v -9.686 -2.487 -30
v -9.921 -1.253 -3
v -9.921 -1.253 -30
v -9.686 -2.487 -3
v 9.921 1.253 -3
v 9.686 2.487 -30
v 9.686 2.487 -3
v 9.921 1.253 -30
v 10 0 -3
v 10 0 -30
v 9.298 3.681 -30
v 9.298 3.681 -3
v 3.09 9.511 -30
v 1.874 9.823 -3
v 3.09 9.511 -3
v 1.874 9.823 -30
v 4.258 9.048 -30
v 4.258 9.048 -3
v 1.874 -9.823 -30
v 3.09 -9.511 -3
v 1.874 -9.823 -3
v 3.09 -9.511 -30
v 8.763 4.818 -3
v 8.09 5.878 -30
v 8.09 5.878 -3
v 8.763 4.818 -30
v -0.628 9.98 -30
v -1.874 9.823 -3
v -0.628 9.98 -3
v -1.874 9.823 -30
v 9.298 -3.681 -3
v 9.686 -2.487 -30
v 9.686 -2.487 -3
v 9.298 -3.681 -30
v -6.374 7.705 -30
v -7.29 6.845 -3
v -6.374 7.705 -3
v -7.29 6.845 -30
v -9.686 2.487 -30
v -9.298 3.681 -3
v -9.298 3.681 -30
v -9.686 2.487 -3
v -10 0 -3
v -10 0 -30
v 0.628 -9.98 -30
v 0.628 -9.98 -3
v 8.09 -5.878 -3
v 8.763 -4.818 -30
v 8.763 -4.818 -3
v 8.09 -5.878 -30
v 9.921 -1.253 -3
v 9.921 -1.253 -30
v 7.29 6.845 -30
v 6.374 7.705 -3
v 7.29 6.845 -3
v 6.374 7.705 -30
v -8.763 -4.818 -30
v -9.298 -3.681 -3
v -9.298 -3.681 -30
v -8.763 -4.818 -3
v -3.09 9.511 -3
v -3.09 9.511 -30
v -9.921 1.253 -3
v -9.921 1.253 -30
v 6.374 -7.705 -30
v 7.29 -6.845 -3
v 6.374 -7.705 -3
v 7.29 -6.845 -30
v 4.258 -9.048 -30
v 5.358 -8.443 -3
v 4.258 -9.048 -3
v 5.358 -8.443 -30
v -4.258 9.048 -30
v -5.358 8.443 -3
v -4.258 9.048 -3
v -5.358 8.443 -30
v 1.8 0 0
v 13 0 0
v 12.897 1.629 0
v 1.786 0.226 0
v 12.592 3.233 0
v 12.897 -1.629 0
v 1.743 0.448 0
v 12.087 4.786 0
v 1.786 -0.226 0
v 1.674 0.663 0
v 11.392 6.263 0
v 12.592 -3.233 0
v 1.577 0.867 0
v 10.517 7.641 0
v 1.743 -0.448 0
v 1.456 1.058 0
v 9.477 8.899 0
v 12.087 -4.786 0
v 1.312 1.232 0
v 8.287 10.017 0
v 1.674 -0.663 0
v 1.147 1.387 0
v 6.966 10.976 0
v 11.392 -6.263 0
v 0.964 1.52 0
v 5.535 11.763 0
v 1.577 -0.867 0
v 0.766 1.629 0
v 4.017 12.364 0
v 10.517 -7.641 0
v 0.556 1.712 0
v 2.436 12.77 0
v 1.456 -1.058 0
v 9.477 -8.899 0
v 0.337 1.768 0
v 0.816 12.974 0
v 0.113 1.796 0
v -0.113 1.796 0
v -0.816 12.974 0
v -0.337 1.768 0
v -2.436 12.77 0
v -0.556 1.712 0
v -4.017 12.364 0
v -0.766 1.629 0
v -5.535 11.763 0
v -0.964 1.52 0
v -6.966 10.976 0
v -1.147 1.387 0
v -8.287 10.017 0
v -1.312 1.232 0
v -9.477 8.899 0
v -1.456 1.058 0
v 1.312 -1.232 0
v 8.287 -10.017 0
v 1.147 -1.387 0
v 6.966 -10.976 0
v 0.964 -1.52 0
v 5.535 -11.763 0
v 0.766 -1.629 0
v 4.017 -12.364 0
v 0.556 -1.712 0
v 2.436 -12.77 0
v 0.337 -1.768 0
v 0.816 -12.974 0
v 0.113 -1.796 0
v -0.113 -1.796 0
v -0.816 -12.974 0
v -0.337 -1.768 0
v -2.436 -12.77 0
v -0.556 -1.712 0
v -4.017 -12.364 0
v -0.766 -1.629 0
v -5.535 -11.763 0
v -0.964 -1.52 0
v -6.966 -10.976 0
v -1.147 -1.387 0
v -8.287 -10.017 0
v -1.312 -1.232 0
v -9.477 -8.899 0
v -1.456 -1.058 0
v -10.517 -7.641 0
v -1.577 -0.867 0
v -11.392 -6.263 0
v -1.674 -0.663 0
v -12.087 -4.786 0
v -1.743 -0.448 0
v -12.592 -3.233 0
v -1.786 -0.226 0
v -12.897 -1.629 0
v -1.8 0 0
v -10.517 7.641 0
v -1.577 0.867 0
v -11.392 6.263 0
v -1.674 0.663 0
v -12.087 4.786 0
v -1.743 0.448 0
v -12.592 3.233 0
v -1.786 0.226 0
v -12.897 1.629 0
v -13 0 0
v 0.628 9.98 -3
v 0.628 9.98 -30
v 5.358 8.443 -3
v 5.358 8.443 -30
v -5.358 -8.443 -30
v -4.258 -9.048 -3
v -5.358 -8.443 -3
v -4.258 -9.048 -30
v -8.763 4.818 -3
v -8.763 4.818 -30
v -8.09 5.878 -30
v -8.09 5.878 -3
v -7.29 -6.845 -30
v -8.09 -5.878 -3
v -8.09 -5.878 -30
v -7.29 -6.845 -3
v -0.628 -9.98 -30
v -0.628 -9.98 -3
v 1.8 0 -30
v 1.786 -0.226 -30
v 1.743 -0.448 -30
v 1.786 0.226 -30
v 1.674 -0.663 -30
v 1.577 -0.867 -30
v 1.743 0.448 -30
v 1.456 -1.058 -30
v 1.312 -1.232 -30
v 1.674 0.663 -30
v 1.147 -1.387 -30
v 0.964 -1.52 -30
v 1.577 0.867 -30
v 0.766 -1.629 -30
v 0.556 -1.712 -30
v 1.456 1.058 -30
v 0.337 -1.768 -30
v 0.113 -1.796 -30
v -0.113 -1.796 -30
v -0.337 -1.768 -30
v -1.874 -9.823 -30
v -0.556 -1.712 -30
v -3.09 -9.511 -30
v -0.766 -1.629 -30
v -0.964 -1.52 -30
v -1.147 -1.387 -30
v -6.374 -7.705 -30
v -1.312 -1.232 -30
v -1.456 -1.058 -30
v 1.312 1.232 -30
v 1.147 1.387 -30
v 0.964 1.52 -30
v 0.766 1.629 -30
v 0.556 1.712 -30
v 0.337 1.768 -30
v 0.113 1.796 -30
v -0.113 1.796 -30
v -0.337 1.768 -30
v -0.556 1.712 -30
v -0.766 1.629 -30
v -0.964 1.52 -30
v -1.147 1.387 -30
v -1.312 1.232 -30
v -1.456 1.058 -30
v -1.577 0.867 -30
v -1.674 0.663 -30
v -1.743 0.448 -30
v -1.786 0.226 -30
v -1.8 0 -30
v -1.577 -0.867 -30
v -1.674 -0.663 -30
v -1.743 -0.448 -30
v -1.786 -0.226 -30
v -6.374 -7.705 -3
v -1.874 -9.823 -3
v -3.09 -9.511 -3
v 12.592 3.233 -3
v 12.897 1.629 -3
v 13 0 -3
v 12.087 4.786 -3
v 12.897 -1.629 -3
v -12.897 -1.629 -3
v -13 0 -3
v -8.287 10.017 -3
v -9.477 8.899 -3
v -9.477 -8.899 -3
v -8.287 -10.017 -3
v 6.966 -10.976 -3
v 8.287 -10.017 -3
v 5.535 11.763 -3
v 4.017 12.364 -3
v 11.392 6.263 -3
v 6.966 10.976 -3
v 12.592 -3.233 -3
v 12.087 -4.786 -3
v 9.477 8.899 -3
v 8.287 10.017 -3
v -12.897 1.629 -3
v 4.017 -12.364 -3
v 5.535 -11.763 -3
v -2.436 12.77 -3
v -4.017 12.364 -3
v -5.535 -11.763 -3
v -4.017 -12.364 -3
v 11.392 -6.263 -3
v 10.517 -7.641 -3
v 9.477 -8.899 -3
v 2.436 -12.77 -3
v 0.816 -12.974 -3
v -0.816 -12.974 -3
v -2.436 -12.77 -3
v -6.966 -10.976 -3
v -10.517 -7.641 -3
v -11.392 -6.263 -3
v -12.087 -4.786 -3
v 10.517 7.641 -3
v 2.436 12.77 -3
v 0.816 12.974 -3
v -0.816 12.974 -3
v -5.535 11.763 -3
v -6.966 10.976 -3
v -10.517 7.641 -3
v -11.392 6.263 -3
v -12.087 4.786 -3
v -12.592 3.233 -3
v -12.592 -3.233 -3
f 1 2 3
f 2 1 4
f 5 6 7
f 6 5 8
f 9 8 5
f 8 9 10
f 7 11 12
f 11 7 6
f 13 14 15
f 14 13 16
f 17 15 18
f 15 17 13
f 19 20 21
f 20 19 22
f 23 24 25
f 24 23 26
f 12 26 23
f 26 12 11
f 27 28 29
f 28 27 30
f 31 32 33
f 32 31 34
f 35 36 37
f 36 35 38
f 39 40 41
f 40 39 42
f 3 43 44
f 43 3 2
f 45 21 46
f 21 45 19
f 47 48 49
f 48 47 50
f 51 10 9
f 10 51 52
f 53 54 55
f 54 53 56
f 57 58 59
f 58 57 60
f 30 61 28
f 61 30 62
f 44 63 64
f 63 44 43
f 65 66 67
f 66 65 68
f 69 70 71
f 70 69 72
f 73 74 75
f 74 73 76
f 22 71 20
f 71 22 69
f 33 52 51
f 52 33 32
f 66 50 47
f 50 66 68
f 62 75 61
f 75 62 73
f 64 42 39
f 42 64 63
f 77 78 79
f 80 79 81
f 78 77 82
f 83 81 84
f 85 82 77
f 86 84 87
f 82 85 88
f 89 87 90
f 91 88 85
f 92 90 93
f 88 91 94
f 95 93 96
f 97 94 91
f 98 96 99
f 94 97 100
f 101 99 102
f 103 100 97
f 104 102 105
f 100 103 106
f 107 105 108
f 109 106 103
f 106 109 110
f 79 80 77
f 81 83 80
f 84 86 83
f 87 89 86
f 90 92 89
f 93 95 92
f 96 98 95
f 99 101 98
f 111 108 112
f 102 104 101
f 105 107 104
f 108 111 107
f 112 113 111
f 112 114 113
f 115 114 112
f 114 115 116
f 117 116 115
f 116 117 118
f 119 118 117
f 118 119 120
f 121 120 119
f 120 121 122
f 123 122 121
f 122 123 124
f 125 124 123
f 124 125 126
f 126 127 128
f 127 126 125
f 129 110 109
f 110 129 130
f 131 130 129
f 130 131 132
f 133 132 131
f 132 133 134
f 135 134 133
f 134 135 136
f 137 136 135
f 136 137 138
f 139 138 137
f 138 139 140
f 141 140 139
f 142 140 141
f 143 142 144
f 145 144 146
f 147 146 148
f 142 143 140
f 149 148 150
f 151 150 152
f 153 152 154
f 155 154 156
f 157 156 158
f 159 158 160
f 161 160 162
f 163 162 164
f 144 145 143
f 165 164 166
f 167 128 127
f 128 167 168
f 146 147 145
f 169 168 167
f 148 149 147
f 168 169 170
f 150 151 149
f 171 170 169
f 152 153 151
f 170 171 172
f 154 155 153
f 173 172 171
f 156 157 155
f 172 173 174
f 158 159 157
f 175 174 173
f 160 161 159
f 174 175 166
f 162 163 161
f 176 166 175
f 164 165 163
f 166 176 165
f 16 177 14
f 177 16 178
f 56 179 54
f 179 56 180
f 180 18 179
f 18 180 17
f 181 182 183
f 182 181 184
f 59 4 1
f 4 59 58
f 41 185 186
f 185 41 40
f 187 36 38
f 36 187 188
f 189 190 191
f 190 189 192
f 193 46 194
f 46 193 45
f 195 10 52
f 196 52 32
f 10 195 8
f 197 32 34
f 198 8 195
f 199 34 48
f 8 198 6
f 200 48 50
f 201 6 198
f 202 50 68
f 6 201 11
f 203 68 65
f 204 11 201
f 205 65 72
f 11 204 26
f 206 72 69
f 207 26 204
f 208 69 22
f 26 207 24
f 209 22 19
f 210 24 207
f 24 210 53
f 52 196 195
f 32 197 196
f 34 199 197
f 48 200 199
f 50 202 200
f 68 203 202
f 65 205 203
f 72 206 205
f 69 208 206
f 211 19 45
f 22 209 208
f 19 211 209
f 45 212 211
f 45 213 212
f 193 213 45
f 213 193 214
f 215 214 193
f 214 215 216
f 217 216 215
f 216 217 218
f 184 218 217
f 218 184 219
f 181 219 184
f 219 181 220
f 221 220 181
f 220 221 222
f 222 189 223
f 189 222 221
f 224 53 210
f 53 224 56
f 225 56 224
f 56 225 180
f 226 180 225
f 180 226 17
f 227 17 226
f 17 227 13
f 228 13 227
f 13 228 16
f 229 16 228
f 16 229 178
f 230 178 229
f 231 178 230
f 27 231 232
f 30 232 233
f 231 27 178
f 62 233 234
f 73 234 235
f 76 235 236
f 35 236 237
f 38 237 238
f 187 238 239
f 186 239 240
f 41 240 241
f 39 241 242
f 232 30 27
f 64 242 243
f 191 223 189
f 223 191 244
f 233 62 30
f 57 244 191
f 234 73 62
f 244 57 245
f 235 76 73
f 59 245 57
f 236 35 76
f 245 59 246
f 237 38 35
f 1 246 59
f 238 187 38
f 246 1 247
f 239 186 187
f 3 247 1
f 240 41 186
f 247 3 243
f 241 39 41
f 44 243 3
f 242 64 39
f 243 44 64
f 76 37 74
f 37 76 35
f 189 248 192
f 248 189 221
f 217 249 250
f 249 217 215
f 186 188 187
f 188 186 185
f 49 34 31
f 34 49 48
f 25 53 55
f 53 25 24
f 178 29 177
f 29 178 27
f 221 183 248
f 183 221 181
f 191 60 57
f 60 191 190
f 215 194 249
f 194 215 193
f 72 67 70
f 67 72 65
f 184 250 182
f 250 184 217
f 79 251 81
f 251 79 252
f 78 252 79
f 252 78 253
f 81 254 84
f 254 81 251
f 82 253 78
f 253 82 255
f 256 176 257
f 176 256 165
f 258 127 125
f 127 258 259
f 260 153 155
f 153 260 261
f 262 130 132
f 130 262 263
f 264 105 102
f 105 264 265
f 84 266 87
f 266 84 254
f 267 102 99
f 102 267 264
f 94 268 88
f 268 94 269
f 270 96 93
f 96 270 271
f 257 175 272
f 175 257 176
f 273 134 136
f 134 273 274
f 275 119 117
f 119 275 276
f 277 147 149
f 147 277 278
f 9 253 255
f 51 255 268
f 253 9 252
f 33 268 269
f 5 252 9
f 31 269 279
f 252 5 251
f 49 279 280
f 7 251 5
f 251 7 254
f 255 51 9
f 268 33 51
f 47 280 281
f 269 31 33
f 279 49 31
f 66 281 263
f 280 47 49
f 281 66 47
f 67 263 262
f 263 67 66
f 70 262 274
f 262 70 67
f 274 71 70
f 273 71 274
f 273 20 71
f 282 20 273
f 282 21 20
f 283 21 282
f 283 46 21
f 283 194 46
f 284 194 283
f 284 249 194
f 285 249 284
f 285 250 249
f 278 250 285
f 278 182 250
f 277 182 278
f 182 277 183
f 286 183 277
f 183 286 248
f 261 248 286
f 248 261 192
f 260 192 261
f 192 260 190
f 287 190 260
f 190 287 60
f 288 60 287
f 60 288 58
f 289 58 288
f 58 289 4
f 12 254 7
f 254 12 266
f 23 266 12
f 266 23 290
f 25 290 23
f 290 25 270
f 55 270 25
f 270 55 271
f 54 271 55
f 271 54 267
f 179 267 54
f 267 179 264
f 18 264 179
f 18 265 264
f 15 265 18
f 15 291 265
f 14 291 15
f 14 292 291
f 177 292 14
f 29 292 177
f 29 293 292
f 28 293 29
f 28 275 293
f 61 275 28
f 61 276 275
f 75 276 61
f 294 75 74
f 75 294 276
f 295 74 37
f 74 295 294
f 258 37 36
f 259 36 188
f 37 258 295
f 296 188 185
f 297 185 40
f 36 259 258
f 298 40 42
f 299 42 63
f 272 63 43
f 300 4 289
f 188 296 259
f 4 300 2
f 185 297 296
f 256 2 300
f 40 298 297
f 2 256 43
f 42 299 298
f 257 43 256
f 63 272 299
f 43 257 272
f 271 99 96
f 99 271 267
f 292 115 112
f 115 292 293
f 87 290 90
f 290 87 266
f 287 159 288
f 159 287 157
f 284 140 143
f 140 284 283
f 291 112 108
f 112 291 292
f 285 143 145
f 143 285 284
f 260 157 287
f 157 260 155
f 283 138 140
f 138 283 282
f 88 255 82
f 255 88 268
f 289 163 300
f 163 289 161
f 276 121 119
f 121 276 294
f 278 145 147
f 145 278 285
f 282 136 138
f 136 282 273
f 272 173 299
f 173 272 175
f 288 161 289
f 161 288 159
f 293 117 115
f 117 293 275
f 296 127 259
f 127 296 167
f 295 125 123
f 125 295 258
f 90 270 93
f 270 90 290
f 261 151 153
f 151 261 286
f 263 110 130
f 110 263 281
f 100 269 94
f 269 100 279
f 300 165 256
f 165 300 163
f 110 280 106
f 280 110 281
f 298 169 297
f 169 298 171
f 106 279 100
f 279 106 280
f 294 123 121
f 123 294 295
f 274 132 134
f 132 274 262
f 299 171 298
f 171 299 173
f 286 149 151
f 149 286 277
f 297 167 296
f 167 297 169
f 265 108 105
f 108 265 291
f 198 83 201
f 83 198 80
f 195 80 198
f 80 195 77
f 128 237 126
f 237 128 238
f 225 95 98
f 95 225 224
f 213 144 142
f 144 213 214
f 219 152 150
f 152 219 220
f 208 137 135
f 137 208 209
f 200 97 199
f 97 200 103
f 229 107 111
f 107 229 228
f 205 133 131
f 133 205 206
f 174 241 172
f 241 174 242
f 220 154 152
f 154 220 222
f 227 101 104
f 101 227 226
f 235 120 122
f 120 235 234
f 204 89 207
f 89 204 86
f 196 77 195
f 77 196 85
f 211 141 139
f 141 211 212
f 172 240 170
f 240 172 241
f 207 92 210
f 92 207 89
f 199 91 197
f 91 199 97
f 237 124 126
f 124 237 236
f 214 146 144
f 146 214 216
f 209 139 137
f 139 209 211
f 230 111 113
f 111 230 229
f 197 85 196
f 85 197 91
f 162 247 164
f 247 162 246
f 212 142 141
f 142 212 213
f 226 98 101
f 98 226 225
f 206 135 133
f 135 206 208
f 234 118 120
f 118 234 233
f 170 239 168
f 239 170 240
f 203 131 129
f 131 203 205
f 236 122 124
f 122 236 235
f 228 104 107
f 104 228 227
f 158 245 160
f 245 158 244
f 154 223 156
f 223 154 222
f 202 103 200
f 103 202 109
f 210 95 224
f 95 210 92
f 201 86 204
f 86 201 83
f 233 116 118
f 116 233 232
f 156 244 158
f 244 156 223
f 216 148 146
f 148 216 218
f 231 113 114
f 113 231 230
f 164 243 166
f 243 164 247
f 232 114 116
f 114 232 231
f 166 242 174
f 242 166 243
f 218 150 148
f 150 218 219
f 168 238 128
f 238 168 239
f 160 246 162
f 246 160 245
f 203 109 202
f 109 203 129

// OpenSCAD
$fn = 50;


difference() {
	union() {
		translate(v = [0, 0, -30.0000000000]) {
			cylinder(h = 30, r = 10.0000000000);
		}
		translate(v = [0, 0, -3.0000000000]) {
			cylinder(h = 3, r = 13.0000000000);
		}
	}
	union() {
		#translate(v = [0, 0, -30]) {
			cylinder(h = 30, r = 1.8000000000);
		}
	}
}
